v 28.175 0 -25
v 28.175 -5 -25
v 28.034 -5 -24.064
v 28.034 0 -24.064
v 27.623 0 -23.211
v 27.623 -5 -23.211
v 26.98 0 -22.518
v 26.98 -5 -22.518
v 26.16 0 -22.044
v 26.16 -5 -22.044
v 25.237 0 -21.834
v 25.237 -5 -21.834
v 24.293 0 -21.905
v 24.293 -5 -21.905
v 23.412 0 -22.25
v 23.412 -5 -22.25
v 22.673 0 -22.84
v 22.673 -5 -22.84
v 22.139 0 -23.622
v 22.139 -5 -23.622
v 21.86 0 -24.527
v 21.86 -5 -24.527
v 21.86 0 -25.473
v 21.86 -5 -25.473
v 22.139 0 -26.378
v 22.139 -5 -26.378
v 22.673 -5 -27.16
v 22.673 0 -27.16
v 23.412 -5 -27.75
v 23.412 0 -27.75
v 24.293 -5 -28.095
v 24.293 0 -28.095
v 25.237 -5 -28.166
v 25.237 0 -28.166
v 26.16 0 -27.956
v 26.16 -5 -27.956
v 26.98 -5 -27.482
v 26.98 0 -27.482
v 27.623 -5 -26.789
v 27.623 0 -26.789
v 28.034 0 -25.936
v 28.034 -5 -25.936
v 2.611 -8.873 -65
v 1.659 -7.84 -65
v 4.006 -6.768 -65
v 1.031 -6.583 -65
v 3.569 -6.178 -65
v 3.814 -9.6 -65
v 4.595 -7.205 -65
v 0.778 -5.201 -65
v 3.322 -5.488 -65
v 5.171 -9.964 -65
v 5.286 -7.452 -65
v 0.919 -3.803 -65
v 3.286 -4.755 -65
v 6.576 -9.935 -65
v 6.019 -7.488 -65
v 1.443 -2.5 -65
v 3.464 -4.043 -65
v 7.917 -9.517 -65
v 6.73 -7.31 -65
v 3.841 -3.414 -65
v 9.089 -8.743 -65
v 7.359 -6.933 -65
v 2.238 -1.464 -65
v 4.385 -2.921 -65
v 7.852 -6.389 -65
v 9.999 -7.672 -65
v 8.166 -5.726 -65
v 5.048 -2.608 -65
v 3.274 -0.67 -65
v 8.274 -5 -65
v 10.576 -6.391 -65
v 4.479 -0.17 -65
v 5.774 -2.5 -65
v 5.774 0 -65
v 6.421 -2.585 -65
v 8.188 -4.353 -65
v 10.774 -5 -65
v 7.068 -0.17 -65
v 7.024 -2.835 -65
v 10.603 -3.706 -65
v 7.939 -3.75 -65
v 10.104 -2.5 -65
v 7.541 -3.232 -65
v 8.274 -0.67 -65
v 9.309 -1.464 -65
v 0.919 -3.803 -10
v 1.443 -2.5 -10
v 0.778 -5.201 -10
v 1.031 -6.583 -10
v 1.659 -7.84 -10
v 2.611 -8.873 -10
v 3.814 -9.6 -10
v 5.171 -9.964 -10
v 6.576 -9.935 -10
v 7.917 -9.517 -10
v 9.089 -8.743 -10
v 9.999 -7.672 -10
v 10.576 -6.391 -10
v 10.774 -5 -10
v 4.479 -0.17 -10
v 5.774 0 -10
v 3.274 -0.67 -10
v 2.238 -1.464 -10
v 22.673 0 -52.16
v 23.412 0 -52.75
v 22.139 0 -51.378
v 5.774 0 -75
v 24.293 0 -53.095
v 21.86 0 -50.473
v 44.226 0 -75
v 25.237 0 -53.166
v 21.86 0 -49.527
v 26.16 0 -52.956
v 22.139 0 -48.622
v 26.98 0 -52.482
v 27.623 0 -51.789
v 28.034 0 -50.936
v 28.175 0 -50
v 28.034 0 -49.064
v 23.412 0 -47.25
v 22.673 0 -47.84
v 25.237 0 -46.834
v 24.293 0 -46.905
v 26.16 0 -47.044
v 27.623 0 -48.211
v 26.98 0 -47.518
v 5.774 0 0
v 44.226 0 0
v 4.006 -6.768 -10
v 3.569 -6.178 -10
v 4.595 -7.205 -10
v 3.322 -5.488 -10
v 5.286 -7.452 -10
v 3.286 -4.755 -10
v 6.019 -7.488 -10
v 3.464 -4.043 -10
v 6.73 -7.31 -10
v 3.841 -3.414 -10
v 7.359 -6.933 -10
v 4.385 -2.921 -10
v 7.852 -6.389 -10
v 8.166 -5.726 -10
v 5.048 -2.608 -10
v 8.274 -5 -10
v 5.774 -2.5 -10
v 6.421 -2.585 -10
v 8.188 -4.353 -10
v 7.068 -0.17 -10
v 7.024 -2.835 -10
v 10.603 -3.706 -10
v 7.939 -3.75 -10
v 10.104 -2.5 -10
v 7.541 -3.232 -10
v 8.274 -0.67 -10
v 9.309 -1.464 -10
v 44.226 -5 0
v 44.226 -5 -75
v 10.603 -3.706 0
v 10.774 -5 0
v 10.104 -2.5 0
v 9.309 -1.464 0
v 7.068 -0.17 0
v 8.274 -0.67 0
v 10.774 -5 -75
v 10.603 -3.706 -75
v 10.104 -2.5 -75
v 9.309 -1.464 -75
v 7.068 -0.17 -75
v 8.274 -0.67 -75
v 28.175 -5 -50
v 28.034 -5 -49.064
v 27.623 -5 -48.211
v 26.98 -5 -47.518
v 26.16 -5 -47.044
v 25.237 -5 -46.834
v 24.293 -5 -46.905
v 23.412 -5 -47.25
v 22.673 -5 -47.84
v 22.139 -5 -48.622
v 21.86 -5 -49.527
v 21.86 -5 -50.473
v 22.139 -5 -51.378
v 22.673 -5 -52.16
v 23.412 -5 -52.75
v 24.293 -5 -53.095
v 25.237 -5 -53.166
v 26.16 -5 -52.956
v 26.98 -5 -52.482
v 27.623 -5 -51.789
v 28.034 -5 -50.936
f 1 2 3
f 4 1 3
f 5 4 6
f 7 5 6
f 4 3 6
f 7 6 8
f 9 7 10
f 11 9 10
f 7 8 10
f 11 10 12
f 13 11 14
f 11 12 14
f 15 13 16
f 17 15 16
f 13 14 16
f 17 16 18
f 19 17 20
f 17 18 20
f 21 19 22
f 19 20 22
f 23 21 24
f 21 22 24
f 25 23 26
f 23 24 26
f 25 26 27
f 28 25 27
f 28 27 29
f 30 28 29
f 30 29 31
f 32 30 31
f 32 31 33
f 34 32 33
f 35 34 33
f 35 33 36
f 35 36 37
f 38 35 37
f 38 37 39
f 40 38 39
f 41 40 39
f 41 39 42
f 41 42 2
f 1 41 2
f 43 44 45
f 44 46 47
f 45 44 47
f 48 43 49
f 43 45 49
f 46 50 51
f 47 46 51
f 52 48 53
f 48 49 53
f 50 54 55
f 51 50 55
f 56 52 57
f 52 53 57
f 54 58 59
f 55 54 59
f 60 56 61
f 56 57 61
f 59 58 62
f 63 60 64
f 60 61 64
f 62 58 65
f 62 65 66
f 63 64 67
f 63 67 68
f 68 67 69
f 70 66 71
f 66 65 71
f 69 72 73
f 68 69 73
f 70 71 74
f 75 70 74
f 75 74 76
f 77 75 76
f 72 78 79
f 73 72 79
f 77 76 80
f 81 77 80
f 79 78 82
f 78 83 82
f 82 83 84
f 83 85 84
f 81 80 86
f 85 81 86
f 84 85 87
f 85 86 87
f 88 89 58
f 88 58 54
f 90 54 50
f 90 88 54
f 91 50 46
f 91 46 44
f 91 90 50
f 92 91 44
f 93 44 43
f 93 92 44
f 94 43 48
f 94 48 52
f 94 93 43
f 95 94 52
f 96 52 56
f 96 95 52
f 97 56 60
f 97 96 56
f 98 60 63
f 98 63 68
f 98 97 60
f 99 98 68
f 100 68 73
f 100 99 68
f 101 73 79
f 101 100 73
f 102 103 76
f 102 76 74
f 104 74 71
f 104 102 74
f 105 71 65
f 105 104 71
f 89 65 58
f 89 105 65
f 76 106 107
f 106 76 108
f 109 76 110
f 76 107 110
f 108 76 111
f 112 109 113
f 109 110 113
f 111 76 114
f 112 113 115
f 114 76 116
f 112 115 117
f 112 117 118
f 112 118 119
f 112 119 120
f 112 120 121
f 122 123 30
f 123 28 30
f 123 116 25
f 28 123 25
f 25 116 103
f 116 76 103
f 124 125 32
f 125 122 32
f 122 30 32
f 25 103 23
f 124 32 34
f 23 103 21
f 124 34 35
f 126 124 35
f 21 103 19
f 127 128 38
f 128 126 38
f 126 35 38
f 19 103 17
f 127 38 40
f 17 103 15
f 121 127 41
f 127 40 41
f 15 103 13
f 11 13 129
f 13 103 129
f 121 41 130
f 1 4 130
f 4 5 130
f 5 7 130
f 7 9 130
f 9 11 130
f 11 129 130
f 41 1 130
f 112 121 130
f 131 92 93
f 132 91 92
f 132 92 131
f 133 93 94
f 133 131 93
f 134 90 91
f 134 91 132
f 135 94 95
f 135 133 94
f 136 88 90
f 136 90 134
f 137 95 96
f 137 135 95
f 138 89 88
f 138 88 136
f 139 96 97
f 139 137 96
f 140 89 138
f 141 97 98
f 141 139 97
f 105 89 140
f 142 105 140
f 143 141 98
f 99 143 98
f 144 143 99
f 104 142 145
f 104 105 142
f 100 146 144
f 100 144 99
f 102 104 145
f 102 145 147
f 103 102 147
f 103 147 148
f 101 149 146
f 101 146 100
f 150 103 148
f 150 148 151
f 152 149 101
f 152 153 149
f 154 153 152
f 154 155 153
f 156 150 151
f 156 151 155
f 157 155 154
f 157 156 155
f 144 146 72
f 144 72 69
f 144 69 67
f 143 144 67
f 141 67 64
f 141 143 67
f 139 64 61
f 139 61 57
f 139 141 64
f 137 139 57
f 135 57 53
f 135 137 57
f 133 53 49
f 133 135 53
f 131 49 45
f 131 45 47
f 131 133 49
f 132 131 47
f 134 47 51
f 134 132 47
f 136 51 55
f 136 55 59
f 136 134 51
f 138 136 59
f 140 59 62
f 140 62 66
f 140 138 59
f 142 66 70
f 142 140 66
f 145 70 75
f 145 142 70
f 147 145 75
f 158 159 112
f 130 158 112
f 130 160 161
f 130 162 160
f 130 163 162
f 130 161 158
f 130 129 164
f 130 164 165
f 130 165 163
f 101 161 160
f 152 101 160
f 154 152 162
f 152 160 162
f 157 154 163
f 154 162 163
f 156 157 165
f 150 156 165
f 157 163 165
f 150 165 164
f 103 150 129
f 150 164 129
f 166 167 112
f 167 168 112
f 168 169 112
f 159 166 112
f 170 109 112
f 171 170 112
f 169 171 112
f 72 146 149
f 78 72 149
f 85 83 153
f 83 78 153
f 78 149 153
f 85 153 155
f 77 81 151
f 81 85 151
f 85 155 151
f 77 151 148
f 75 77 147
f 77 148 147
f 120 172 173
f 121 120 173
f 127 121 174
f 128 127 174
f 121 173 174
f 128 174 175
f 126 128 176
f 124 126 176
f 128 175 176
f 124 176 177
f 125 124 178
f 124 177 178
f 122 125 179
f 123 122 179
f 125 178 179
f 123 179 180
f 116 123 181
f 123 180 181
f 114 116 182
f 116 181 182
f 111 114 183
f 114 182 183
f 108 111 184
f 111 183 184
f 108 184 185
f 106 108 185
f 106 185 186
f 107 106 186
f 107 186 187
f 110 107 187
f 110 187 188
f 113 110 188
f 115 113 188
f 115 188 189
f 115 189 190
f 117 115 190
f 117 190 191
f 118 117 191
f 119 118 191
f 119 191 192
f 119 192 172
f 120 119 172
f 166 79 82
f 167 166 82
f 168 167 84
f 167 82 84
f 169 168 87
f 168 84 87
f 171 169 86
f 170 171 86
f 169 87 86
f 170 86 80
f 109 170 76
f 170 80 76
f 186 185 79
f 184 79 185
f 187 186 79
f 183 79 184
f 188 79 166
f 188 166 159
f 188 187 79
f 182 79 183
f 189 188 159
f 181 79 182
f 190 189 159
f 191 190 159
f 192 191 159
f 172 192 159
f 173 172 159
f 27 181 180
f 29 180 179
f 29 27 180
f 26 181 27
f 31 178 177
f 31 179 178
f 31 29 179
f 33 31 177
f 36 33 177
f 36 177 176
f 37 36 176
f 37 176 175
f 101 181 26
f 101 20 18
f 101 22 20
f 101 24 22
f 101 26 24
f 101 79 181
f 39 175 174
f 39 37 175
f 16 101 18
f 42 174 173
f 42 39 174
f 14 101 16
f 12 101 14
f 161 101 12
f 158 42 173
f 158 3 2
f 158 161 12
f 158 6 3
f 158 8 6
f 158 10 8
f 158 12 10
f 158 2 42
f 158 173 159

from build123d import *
from build123d.topology import SkipClean

# Parameters (mm, degrees)
SKETCH1_W           = 38.452994616
SKETCH1_H           = 5
BOSS_EXTRUDE1_DEPTH = 75
BOSS_EXTRUDE2_START = -10
BOSS_EXTRUDE2_DEPTH = 55
SKETCH5_R           = 3.175
CUT_EXTRUDE8_DEPTH  = 55
CUT_EXTRUDE9_DEPTH  = 75
CUT_EXTRUDE10_DEPTH = 10
CUT_EXTRUDE11_START = -65
CUT_EXTRUDE11_DEPTH = 10


with BuildPart() as part:
    # Sketch1 → Boss-Extrude1 (new body)
    with BuildSketch(Plane.XY):
        with Locations((25, -2.5)):
            Rectangle(SKETCH1_W, SKETCH1_H)
    extrude(amount=-BOSS_EXTRUDE1_DEPTH)

    # Sketch1<4> → Boss-Extrude2 (add)
    with BuildSketch(Plane.XY.offset(BOSS_EXTRUDE2_START)):
        with BuildLine():
            Line((5.773502692, -2.5), (5.773502692, 0))
            ThreePointArc((5.773502692, 0), (3.273502704, -0.669872974), (1.443375686, -2.499999977))
            ThreePointArc((1.443375686, -2.499999977), (4.479407453, -9.829629128), (10.773502692, -5))
            Line((10.773502692, -5), (8.273502692, -5))
            ThreePointArc((8.273502692, -5), (4.005735739, -6.767766953), (5.773502692, -2.5))
        make_face()
    extrude(amount=-BOSS_EXTRUDE2_DEPTH)

    # Sketch5 → Cut-Extrude8 (cut)
    with BuildSketch(Plane.XZ.offset(5)):
        with Locations((25, -25)):
            Circle(SKETCH5_R)
        with Locations((25, -50)):
            Circle(SKETCH5_R)
    extrude(amount=-CUT_EXTRUDE8_DEPTH, mode=Mode.SUBTRACT)

    # Sketch1<14> → Cut-Extrude9 (cut)
    with SkipClean():  # the faces are left unmerged after this step: merging them gives an invalid solid
        with BuildSketch(Plane.XY):
            with BuildLine():
                ThreePointArc((8.273502692, -5), (7.541269645, -3.232233047), (5.773502692, -2.5))
                Line((5.773502692, -2.5), (5.773502692, -5))
                Line((5.773502692, -5), (8.273502692, -5))
            make_face()
        extrude(amount=-CUT_EXTRUDE9_DEPTH, mode=Mode.SUBTRACT)

    # Sketch1<15> → Cut-Extrude10 (cut)
    with SkipClean():  # the faces are left unmerged after this step: merging them gives an invalid solid
        with BuildSketch(Plane.XY):
            with BuildLine():
                ThreePointArc((10.773502692, -5), (9.309036598, -1.464466094), (5.773502692, 0))
                Line((5.773502692, 0), (5.773502692, -2.5))
                ThreePointArc((5.773502692, -2.5), (7.541269645, -3.232233047), (8.273502692, -5))
                Line((8.273502692, -5), (10.773502692, -5))
            make_face()
        extrude(amount=-CUT_EXTRUDE10_DEPTH, mode=Mode.SUBTRACT)

    # Sketch1<16> → Cut-Extrude11 (cut)
    with BuildSketch(Plane.XY.offset(CUT_EXTRUDE11_START)):
        with BuildLine():
            ThreePointArc((10.773502692, -5), (9.309036598, -1.464466094), (5.773502692, 0))
            Line((5.773502692, 0), (5.773502692, -2.5))
            ThreePointArc((5.773502692, -2.5), (7.541269645, -3.232233047), (8.273502692, -5))
            Line((8.273502692, -5), (10.773502692, -5))
        make_face()
    extrude(amount=-CUT_EXTRUDE11_DEPTH, mode=Mode.SUBTRACT)


solid = part.part
